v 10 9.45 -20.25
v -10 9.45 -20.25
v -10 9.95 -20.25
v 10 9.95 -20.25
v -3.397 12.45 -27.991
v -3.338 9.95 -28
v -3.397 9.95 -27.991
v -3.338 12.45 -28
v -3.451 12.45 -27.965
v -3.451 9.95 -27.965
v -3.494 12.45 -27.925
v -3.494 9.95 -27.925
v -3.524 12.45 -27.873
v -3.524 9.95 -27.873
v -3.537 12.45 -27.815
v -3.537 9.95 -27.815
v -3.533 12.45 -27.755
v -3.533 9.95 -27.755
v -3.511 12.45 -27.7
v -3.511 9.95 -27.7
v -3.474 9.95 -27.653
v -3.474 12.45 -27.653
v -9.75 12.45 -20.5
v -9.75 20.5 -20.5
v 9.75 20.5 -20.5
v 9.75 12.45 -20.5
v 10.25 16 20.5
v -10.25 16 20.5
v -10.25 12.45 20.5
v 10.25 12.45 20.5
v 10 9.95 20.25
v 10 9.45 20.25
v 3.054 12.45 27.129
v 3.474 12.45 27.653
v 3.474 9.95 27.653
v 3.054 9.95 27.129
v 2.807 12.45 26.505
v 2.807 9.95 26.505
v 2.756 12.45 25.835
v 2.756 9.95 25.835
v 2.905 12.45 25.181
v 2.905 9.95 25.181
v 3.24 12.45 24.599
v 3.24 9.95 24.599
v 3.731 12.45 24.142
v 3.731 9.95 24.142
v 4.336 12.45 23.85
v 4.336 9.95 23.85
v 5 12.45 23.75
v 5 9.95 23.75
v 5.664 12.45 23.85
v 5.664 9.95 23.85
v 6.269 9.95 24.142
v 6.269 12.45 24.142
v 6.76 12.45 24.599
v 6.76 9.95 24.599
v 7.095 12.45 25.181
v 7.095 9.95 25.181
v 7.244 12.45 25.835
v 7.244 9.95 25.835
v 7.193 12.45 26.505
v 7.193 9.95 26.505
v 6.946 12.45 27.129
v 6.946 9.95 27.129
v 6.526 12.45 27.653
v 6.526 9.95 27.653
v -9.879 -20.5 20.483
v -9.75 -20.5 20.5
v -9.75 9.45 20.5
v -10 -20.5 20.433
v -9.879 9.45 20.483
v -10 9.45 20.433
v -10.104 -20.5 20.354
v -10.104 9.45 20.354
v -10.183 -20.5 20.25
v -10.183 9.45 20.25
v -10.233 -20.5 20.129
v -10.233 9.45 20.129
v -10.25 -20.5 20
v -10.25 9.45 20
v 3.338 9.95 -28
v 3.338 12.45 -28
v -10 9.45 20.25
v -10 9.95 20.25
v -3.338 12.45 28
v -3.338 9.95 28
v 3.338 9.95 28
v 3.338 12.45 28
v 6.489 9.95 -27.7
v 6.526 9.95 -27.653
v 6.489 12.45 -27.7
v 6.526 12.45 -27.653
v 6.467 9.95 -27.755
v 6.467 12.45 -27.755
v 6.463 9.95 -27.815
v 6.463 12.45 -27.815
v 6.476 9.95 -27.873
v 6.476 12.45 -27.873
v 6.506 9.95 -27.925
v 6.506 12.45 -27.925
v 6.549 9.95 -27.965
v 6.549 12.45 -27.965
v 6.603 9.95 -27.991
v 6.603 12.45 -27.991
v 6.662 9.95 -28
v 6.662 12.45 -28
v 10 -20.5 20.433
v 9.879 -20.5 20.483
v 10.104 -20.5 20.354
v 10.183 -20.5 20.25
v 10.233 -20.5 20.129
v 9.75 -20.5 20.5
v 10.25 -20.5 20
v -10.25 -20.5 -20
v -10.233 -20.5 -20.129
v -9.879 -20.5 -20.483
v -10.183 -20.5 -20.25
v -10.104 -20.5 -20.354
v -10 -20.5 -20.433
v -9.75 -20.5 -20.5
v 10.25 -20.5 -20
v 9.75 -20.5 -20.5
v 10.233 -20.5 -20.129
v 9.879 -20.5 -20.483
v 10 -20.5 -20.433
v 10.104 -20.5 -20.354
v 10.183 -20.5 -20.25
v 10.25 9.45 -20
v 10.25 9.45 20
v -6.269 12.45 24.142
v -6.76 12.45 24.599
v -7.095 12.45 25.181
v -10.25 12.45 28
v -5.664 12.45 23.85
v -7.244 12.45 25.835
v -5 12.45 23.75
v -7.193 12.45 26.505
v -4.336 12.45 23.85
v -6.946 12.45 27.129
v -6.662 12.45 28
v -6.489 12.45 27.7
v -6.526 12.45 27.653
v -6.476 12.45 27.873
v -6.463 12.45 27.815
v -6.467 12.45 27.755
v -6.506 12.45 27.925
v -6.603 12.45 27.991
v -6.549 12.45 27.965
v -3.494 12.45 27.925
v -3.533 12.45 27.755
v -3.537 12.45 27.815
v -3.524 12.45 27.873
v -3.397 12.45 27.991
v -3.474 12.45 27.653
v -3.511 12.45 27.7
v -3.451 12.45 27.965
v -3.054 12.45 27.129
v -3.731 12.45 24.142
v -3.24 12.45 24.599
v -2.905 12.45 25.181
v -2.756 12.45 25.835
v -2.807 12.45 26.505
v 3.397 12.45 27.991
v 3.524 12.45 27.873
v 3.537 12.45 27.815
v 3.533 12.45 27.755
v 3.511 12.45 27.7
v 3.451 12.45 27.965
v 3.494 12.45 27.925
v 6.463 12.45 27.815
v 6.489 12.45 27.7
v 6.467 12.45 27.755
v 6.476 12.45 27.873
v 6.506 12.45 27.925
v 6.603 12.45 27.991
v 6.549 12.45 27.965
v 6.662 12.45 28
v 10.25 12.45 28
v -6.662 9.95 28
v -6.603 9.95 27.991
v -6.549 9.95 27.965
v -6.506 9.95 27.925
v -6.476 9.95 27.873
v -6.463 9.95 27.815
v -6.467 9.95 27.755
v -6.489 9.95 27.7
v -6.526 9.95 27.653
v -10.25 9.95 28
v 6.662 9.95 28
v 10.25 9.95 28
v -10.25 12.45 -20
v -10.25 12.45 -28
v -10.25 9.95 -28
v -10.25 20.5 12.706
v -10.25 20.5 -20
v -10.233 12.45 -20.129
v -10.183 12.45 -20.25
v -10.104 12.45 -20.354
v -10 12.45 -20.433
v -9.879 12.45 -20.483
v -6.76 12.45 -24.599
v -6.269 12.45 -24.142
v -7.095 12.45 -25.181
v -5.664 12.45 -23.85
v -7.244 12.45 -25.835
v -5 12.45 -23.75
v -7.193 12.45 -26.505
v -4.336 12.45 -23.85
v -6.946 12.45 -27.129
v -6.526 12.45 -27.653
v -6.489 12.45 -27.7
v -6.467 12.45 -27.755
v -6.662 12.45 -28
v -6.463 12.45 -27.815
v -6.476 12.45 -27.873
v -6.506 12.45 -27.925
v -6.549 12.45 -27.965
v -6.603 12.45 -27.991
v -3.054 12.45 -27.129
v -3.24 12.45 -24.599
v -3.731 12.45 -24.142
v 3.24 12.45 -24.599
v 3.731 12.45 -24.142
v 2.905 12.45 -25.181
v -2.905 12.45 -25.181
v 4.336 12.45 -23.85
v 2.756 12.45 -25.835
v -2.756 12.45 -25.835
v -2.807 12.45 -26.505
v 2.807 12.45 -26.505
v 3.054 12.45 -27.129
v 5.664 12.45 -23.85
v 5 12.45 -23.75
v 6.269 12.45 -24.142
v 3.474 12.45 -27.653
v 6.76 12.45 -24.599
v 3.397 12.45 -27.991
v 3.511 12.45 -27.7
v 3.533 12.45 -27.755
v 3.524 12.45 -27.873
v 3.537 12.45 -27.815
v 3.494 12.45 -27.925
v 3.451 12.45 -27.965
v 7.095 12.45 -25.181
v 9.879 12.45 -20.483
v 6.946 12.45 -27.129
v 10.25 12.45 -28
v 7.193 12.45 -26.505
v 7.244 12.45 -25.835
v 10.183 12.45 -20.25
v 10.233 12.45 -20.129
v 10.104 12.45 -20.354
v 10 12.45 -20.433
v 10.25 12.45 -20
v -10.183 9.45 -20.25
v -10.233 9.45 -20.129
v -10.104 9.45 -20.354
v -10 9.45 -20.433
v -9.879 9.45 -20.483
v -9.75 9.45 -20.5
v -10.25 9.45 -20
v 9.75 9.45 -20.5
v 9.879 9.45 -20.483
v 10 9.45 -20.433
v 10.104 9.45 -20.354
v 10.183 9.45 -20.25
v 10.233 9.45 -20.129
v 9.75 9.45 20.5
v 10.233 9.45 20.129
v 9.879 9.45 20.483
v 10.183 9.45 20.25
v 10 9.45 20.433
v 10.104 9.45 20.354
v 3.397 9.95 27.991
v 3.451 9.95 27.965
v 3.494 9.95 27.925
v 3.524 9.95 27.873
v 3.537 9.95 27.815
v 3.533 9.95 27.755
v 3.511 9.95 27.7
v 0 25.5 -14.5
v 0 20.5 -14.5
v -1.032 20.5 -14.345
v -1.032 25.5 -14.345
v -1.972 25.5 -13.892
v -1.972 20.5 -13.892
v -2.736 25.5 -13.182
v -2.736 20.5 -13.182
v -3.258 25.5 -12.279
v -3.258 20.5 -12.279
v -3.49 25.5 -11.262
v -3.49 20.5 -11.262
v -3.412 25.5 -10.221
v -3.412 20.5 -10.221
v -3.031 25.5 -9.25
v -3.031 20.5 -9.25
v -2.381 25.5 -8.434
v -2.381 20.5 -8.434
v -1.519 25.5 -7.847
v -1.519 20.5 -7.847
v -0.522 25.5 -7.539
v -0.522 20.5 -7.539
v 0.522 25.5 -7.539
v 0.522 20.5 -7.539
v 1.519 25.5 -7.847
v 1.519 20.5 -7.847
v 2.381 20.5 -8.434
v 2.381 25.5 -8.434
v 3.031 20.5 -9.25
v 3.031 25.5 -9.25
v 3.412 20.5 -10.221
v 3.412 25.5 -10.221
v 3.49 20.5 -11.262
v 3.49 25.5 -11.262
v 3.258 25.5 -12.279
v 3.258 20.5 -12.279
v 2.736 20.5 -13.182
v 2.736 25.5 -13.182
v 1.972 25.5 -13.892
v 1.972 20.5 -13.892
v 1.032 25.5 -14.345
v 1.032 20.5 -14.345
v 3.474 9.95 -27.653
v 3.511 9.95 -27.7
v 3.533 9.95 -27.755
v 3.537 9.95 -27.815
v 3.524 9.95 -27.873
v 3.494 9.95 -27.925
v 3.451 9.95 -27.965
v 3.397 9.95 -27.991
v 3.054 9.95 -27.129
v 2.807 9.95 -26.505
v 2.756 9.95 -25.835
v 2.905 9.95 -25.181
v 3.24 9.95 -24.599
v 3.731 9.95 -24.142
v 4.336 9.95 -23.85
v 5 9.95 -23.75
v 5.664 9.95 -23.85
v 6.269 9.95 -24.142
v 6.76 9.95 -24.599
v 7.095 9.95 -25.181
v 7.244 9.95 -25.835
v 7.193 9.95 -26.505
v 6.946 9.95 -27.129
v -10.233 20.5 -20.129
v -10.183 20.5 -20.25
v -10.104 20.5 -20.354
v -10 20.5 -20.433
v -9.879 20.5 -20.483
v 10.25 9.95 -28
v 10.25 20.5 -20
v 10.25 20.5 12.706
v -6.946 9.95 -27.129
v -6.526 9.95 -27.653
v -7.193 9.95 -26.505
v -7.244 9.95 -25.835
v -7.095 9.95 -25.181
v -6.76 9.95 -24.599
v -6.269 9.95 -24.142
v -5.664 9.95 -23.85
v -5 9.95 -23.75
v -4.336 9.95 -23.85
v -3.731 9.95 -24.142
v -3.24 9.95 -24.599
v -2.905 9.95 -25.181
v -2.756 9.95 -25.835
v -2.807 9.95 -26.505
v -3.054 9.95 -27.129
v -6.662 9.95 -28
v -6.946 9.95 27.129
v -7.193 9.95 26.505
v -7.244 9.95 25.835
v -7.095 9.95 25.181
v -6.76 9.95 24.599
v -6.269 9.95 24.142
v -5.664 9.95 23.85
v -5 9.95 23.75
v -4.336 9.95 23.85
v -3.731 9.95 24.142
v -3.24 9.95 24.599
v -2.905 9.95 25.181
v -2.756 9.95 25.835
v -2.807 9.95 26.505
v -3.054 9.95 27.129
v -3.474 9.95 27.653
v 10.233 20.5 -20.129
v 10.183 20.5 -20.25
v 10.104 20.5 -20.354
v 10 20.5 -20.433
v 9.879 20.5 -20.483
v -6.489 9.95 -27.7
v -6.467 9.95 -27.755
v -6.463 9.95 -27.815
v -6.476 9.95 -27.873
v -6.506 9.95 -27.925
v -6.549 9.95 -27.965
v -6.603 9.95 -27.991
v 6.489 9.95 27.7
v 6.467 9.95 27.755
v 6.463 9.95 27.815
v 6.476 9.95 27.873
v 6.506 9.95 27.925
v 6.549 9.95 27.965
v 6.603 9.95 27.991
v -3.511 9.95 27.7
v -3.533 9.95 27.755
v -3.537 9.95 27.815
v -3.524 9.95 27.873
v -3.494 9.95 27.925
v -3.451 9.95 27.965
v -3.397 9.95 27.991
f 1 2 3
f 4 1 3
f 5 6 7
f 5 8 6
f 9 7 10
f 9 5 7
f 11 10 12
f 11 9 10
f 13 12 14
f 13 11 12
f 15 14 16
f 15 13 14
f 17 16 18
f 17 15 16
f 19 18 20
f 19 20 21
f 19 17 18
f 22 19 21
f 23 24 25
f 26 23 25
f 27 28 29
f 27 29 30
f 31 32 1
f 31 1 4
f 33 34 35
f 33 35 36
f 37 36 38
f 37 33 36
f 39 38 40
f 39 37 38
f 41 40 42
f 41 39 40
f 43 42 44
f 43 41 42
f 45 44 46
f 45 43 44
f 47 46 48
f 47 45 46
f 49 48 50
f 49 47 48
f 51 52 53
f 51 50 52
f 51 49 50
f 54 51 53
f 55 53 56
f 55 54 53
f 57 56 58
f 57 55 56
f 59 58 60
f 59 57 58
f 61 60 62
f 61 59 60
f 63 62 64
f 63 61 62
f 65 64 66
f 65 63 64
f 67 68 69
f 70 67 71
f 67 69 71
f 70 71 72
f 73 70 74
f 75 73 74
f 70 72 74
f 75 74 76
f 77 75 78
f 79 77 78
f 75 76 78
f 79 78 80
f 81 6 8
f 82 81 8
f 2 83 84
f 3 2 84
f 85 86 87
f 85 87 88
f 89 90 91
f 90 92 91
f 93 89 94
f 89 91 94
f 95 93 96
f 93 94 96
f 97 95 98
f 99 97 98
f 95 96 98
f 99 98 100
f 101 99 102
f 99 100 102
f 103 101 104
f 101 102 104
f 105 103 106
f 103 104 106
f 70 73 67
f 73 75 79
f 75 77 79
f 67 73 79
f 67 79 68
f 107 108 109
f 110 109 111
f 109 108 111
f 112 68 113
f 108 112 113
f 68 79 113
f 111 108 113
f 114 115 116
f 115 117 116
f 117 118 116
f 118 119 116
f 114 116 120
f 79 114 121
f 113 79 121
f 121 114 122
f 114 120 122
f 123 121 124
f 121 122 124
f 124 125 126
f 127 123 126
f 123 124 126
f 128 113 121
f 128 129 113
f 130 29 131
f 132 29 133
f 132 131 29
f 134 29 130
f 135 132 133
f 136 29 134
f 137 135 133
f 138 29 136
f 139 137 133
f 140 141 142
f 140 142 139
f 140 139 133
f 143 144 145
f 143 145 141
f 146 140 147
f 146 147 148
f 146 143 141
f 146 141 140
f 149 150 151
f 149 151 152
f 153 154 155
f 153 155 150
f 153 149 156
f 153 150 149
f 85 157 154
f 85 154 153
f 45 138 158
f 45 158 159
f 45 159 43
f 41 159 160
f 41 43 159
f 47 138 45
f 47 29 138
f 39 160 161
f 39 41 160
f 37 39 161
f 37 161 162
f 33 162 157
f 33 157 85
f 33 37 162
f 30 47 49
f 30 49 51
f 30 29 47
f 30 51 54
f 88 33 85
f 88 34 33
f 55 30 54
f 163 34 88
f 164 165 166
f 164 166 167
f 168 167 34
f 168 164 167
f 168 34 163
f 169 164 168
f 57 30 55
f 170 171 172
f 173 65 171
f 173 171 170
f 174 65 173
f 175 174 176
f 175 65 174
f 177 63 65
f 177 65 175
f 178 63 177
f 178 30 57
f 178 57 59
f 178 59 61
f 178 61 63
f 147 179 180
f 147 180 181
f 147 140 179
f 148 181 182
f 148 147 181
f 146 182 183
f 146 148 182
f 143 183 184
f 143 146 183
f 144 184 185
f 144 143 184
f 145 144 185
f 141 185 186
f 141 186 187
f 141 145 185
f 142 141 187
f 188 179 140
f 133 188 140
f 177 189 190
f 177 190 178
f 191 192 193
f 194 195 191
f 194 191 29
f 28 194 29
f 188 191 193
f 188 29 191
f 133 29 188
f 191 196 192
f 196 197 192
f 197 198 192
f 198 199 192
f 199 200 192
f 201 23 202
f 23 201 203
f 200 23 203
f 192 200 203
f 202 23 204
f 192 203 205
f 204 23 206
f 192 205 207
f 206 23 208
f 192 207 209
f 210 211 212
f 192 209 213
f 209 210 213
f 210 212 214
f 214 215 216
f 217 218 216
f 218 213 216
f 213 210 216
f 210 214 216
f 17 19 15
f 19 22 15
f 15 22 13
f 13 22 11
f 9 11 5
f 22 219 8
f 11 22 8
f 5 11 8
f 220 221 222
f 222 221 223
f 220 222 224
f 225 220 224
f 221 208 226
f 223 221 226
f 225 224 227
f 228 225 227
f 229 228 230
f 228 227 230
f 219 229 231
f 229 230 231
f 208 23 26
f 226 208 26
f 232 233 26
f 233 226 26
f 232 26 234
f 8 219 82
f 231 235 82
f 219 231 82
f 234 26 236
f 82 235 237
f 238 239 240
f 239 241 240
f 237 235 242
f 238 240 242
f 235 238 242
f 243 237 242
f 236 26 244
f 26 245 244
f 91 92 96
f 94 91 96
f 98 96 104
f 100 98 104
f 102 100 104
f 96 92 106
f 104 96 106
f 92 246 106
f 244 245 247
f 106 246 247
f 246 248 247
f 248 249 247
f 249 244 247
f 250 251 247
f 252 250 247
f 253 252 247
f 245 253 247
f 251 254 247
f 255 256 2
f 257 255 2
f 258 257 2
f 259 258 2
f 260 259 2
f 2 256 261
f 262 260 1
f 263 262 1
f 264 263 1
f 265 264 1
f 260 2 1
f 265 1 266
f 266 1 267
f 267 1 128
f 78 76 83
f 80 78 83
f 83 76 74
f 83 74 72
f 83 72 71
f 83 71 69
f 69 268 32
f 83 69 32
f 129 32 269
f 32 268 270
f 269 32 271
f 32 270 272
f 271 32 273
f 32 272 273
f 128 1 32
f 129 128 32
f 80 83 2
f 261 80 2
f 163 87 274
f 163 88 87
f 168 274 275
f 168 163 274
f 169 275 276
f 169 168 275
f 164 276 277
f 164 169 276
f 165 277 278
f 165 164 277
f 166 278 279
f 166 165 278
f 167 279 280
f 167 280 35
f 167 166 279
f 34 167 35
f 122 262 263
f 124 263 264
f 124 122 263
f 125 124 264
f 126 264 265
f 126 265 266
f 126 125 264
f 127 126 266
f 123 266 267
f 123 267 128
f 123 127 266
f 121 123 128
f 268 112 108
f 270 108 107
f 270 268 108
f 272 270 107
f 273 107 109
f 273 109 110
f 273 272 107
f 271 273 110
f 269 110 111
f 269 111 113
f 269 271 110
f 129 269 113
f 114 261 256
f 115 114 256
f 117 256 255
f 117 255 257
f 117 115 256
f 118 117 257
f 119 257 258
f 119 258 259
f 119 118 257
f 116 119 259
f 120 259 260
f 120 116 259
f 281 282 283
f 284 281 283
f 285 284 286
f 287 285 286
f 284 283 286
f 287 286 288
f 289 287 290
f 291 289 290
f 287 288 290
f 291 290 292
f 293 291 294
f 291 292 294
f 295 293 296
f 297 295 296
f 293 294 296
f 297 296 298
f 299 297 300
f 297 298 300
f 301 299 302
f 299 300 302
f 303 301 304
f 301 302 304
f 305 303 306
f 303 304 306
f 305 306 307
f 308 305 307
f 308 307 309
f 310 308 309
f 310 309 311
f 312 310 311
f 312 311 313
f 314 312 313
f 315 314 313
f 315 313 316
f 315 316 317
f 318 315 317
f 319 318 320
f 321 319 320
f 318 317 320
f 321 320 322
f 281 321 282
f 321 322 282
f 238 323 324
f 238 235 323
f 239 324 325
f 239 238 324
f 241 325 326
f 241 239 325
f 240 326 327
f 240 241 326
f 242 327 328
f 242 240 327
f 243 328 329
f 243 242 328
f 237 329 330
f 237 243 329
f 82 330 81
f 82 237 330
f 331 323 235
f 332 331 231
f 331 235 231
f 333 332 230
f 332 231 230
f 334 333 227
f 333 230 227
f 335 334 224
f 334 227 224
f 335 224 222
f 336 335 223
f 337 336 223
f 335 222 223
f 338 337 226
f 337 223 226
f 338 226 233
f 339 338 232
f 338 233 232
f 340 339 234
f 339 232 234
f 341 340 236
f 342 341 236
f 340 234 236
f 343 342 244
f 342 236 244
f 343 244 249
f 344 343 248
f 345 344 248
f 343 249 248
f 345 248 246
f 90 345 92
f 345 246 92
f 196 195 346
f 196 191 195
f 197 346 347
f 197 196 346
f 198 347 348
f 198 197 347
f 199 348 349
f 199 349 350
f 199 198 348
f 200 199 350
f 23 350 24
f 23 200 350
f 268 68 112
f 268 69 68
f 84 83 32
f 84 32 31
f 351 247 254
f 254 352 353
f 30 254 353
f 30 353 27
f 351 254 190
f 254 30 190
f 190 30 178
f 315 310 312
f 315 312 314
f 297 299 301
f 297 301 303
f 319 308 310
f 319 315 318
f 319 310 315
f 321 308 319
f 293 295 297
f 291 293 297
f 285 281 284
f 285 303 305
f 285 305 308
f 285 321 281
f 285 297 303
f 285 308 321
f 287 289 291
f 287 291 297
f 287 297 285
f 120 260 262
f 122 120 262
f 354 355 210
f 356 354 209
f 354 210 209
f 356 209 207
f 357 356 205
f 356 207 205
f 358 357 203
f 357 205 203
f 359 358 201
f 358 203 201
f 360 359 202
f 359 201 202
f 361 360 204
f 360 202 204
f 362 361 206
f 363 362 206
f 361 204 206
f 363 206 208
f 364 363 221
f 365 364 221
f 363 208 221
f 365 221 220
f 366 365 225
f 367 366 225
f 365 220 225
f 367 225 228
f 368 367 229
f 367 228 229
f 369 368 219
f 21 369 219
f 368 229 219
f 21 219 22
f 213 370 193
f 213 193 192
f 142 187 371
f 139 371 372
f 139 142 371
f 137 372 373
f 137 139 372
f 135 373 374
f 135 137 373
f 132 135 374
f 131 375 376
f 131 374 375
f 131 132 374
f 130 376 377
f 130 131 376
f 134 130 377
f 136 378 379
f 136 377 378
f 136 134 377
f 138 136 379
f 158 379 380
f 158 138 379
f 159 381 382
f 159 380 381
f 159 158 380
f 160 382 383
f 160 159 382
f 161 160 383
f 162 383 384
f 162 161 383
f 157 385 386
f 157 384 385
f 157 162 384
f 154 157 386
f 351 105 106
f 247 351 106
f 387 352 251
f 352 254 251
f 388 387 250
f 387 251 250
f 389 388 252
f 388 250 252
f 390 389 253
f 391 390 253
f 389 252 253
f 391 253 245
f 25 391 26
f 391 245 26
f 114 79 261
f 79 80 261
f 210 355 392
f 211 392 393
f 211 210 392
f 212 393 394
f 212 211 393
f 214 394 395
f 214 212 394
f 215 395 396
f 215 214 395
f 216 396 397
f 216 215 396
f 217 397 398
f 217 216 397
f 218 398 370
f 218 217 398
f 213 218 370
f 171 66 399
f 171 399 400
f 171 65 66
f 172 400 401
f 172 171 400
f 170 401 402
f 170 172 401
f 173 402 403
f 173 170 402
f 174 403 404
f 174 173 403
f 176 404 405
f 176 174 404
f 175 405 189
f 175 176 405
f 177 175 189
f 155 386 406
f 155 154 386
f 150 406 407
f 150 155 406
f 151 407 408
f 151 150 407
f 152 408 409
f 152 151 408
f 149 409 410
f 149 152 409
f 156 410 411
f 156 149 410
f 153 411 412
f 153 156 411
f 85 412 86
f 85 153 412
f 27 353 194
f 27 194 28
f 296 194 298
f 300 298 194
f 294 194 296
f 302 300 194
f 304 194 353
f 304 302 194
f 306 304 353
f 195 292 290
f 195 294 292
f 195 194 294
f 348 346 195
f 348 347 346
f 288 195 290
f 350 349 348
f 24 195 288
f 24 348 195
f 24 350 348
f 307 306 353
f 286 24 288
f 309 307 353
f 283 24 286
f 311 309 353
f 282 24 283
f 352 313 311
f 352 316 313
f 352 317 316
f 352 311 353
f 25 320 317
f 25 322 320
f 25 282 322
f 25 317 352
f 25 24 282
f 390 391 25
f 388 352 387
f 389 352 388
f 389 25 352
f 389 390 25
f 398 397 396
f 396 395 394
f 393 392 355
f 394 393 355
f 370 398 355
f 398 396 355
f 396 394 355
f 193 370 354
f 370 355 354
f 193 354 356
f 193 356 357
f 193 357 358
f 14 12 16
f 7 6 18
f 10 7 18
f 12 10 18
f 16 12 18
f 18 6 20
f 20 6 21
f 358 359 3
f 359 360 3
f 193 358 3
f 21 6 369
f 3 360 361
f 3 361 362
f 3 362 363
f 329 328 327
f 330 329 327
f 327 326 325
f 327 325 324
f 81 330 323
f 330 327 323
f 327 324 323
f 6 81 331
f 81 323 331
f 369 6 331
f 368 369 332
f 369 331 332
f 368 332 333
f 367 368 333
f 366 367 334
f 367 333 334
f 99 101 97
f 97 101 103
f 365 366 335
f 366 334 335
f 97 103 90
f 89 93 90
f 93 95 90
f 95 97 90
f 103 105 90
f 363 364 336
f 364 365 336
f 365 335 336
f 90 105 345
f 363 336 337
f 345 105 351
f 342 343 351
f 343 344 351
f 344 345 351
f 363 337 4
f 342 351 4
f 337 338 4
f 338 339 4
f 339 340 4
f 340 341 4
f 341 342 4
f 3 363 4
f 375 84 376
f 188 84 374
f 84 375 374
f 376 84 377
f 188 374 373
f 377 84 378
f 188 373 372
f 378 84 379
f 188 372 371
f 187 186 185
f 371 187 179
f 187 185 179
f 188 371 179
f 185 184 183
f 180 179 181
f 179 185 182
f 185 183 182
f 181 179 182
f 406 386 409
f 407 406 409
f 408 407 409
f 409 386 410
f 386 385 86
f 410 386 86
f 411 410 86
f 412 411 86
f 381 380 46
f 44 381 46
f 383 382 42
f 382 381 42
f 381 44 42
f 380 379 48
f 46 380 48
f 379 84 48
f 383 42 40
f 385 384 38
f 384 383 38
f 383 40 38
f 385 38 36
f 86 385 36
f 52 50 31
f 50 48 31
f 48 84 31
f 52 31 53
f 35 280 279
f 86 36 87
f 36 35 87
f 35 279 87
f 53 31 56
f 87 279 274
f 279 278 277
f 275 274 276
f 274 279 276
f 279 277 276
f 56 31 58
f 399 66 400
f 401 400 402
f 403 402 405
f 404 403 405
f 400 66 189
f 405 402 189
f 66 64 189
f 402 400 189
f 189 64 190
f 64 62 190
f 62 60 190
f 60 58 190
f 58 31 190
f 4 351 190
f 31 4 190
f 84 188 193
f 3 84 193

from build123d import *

# Parameters (mm, degrees)
SKETCH_1_W               = 20.5
SKETCH_1_H               = 41
EXTRUDE_1_DEPTH          = 20.5
SKETCH_2_W               = 0.5
SKETCH_2_H               = 0.5
CUT_EXTRUDE_1_DEPTH      = 31.75
SKETCH_3_W               = 0.5
SKETCH_3_H               = 0.5
CUT_EXTRUDE_2_DEPTH      = 31.75
SKETCH_4_W               = 7.5
SKETCH_4_H               = 2.5
EXTRUDE_2_DEPTH          = 10.25
SKETCH_5_R               = 2.25
CUT_EXTRUDE_3_DEPTH      = 45.438328051
FILLET_1_R               = 0.2
FILLET_1_OF_MIRROR_3_R   = 0.2
CUT_EXTRUDE_4_DEPTH      = 37.184423444
CUT_EXTRUDE_4_DEPTH_BACK = 37.184423444
FILLET_2_R               = 0.5
SKETCH_7_R               = 3.5
EXTRUDE_3_DEPTH          = 5


with BuildPart() as part:
    # 스케치1 → 보스-돌출1 (new, symmetric)
    with BuildSketch(Plane(origin=(0, 0, 0), x_dir=(1, 0, 0), z_dir=(0, 1, 0))):
        Rectangle(SKETCH_1_W, SKETCH_1_H)
    extrude(amount=EXTRUDE_1_DEPTH, both=True)

    # 스케치2 → 컷-돌출1 (cut, symmetric)
    with BuildSketch(Plane.XY):
        with Locations((-10.25, 9.7)):
            Rectangle(SKETCH_2_W, SKETCH_2_H)
    cut_extrude_1 = extrude(amount=CUT_EXTRUDE_1_DEPTH, both=True, mode=Mode.SUBTRACT)

    # 대칭 복사1: 컷-돌출1 across plane
    add(cut_extrude_1.mirror(Plane(origin=(0, 0, 0), x_dir=(0, 0, 1), z_dir=(1, 0, 0))), mode=Mode.SUBTRACT)

    # 스케치3 → 컷-돌출2 (cut, symmetric)
    with BuildSketch(Plane(origin=(0, 0, 0), x_dir=(0, 0, -1), z_dir=(1, 0, 0))):
        with Locations((-20.5, 9.7)):
            Rectangle(SKETCH_3_W, SKETCH_3_H)
    cut_extrude_2 = extrude(amount=CUT_EXTRUDE_2_DEPTH, both=True, mode=Mode.SUBTRACT)

    # 대칭 복사2: 컷-돌출2 across plane
    add(cut_extrude_2.mirror(Plane.XY), mode=Mode.SUBTRACT)

    # 스케치4 → 보스-돌출2 (add, symmetric)
    with BuildSketch(Plane(origin=(0, 0, 0), x_dir=(0, 0, -1), z_dir=(1, 0, 0))):
        with Locations((24.25, 11.2)):
            Rectangle(SKETCH_4_W, SKETCH_4_H)
    extrude_2 = extrude(amount=EXTRUDE_2_DEPTH, both=True)

    # 스케치5 → 컷-돌출3 (cut, symmetric)
    with BuildSketch(Plane(origin=(0, 12.45, 0), x_dir=(1, 0, 0), z_dir=(0, 1, 0))):
        with Locations((5, 26)):
            Circle(SKETCH_5_R)
        with Locations((-5, 26)):
            Circle(SKETCH_5_R)
    cut_extrude_3 = extrude(amount=CUT_EXTRUDE_3_DEPTH, both=True, mode=Mode.SUBTRACT)

    # 필렛1
    fillet_1_edges = [part.edges().sort_by_distance(p)[0] for p in [
        (3.969223594, 11.2, -28),
        (6.030776406, 11.2, -28),
        (-6.030776406, 11.2, -28),
        (-3.969223594, 11.2, -28),
    ]]
    fillet(fillet_1_edges, radius=FILLET_1_R)

    # 대칭 복사3: 보스-돌출2, 컷-돌출3 across plane
    add(extrude_2.mirror(Plane.XY))
    add(cut_extrude_3.mirror(Plane.XY), mode=Mode.SUBTRACT)

    # 필렛1 of 대칭 복사3
    fillet_1_of_mirror_3_edges = [part.edges().sort_by_distance(p)[0] for p in [
        (3.969223594, 11.2, 28),
        (6.030776406, 11.2, 28),
        (-6.030776406, 11.2, 28),
        (-3.969223594, 11.2, 28),
    ]]
    fillet(fillet_1_of_mirror_3_edges, radius=FILLET_1_OF_MIRROR_3_R)

    # 스케치6 → 컷-돌출4 (cut, two sides: drawn at the far end of the back side and taken through both)
    with BuildSketch(Plane(origin=(0, 0, 0), x_dir=(0, 0, -1), z_dir=(1, 0, 0)).offset(-CUT_EXTRUDE_4_DEPTH_BACK)):
        Polygon((-20.5, 16), (-20.5, 20.5), (-12.705771366, 20.5), align=None)
    extrude(amount=CUT_EXTRUDE_4_DEPTH + CUT_EXTRUDE_4_DEPTH_BACK, mode=Mode.SUBTRACT)

    # 필렛2
    fillet_2_edges = [part.edges().sort_by_distance(p)[0] for p in [
        (-10.25, -5.525, 20.5),
        (-10.25, -5.525, -20.5),
        (10.25, -5.525, 20.5),
        (10.25, -5.525, -20.5),
        (-10.25, 16.475, -20.5),
        (10.25, 16.475, -20.5),
    ]]
    fillet(fillet_2_edges, radius=FILLET_2_R)

    # 스케치7 → 보스-돌출3 (add)
    with BuildSketch(Plane(origin=(0, 20.5, 0), x_dir=(1, 0, 0), z_dir=(0, 1, 0))):
        with Locations(Location((0, 11, 0), (0, 0, 90))):
            Circle(SKETCH_7_R)
    extrude(amount=EXTRUDE_3_DEPTH)


solid = part.part
